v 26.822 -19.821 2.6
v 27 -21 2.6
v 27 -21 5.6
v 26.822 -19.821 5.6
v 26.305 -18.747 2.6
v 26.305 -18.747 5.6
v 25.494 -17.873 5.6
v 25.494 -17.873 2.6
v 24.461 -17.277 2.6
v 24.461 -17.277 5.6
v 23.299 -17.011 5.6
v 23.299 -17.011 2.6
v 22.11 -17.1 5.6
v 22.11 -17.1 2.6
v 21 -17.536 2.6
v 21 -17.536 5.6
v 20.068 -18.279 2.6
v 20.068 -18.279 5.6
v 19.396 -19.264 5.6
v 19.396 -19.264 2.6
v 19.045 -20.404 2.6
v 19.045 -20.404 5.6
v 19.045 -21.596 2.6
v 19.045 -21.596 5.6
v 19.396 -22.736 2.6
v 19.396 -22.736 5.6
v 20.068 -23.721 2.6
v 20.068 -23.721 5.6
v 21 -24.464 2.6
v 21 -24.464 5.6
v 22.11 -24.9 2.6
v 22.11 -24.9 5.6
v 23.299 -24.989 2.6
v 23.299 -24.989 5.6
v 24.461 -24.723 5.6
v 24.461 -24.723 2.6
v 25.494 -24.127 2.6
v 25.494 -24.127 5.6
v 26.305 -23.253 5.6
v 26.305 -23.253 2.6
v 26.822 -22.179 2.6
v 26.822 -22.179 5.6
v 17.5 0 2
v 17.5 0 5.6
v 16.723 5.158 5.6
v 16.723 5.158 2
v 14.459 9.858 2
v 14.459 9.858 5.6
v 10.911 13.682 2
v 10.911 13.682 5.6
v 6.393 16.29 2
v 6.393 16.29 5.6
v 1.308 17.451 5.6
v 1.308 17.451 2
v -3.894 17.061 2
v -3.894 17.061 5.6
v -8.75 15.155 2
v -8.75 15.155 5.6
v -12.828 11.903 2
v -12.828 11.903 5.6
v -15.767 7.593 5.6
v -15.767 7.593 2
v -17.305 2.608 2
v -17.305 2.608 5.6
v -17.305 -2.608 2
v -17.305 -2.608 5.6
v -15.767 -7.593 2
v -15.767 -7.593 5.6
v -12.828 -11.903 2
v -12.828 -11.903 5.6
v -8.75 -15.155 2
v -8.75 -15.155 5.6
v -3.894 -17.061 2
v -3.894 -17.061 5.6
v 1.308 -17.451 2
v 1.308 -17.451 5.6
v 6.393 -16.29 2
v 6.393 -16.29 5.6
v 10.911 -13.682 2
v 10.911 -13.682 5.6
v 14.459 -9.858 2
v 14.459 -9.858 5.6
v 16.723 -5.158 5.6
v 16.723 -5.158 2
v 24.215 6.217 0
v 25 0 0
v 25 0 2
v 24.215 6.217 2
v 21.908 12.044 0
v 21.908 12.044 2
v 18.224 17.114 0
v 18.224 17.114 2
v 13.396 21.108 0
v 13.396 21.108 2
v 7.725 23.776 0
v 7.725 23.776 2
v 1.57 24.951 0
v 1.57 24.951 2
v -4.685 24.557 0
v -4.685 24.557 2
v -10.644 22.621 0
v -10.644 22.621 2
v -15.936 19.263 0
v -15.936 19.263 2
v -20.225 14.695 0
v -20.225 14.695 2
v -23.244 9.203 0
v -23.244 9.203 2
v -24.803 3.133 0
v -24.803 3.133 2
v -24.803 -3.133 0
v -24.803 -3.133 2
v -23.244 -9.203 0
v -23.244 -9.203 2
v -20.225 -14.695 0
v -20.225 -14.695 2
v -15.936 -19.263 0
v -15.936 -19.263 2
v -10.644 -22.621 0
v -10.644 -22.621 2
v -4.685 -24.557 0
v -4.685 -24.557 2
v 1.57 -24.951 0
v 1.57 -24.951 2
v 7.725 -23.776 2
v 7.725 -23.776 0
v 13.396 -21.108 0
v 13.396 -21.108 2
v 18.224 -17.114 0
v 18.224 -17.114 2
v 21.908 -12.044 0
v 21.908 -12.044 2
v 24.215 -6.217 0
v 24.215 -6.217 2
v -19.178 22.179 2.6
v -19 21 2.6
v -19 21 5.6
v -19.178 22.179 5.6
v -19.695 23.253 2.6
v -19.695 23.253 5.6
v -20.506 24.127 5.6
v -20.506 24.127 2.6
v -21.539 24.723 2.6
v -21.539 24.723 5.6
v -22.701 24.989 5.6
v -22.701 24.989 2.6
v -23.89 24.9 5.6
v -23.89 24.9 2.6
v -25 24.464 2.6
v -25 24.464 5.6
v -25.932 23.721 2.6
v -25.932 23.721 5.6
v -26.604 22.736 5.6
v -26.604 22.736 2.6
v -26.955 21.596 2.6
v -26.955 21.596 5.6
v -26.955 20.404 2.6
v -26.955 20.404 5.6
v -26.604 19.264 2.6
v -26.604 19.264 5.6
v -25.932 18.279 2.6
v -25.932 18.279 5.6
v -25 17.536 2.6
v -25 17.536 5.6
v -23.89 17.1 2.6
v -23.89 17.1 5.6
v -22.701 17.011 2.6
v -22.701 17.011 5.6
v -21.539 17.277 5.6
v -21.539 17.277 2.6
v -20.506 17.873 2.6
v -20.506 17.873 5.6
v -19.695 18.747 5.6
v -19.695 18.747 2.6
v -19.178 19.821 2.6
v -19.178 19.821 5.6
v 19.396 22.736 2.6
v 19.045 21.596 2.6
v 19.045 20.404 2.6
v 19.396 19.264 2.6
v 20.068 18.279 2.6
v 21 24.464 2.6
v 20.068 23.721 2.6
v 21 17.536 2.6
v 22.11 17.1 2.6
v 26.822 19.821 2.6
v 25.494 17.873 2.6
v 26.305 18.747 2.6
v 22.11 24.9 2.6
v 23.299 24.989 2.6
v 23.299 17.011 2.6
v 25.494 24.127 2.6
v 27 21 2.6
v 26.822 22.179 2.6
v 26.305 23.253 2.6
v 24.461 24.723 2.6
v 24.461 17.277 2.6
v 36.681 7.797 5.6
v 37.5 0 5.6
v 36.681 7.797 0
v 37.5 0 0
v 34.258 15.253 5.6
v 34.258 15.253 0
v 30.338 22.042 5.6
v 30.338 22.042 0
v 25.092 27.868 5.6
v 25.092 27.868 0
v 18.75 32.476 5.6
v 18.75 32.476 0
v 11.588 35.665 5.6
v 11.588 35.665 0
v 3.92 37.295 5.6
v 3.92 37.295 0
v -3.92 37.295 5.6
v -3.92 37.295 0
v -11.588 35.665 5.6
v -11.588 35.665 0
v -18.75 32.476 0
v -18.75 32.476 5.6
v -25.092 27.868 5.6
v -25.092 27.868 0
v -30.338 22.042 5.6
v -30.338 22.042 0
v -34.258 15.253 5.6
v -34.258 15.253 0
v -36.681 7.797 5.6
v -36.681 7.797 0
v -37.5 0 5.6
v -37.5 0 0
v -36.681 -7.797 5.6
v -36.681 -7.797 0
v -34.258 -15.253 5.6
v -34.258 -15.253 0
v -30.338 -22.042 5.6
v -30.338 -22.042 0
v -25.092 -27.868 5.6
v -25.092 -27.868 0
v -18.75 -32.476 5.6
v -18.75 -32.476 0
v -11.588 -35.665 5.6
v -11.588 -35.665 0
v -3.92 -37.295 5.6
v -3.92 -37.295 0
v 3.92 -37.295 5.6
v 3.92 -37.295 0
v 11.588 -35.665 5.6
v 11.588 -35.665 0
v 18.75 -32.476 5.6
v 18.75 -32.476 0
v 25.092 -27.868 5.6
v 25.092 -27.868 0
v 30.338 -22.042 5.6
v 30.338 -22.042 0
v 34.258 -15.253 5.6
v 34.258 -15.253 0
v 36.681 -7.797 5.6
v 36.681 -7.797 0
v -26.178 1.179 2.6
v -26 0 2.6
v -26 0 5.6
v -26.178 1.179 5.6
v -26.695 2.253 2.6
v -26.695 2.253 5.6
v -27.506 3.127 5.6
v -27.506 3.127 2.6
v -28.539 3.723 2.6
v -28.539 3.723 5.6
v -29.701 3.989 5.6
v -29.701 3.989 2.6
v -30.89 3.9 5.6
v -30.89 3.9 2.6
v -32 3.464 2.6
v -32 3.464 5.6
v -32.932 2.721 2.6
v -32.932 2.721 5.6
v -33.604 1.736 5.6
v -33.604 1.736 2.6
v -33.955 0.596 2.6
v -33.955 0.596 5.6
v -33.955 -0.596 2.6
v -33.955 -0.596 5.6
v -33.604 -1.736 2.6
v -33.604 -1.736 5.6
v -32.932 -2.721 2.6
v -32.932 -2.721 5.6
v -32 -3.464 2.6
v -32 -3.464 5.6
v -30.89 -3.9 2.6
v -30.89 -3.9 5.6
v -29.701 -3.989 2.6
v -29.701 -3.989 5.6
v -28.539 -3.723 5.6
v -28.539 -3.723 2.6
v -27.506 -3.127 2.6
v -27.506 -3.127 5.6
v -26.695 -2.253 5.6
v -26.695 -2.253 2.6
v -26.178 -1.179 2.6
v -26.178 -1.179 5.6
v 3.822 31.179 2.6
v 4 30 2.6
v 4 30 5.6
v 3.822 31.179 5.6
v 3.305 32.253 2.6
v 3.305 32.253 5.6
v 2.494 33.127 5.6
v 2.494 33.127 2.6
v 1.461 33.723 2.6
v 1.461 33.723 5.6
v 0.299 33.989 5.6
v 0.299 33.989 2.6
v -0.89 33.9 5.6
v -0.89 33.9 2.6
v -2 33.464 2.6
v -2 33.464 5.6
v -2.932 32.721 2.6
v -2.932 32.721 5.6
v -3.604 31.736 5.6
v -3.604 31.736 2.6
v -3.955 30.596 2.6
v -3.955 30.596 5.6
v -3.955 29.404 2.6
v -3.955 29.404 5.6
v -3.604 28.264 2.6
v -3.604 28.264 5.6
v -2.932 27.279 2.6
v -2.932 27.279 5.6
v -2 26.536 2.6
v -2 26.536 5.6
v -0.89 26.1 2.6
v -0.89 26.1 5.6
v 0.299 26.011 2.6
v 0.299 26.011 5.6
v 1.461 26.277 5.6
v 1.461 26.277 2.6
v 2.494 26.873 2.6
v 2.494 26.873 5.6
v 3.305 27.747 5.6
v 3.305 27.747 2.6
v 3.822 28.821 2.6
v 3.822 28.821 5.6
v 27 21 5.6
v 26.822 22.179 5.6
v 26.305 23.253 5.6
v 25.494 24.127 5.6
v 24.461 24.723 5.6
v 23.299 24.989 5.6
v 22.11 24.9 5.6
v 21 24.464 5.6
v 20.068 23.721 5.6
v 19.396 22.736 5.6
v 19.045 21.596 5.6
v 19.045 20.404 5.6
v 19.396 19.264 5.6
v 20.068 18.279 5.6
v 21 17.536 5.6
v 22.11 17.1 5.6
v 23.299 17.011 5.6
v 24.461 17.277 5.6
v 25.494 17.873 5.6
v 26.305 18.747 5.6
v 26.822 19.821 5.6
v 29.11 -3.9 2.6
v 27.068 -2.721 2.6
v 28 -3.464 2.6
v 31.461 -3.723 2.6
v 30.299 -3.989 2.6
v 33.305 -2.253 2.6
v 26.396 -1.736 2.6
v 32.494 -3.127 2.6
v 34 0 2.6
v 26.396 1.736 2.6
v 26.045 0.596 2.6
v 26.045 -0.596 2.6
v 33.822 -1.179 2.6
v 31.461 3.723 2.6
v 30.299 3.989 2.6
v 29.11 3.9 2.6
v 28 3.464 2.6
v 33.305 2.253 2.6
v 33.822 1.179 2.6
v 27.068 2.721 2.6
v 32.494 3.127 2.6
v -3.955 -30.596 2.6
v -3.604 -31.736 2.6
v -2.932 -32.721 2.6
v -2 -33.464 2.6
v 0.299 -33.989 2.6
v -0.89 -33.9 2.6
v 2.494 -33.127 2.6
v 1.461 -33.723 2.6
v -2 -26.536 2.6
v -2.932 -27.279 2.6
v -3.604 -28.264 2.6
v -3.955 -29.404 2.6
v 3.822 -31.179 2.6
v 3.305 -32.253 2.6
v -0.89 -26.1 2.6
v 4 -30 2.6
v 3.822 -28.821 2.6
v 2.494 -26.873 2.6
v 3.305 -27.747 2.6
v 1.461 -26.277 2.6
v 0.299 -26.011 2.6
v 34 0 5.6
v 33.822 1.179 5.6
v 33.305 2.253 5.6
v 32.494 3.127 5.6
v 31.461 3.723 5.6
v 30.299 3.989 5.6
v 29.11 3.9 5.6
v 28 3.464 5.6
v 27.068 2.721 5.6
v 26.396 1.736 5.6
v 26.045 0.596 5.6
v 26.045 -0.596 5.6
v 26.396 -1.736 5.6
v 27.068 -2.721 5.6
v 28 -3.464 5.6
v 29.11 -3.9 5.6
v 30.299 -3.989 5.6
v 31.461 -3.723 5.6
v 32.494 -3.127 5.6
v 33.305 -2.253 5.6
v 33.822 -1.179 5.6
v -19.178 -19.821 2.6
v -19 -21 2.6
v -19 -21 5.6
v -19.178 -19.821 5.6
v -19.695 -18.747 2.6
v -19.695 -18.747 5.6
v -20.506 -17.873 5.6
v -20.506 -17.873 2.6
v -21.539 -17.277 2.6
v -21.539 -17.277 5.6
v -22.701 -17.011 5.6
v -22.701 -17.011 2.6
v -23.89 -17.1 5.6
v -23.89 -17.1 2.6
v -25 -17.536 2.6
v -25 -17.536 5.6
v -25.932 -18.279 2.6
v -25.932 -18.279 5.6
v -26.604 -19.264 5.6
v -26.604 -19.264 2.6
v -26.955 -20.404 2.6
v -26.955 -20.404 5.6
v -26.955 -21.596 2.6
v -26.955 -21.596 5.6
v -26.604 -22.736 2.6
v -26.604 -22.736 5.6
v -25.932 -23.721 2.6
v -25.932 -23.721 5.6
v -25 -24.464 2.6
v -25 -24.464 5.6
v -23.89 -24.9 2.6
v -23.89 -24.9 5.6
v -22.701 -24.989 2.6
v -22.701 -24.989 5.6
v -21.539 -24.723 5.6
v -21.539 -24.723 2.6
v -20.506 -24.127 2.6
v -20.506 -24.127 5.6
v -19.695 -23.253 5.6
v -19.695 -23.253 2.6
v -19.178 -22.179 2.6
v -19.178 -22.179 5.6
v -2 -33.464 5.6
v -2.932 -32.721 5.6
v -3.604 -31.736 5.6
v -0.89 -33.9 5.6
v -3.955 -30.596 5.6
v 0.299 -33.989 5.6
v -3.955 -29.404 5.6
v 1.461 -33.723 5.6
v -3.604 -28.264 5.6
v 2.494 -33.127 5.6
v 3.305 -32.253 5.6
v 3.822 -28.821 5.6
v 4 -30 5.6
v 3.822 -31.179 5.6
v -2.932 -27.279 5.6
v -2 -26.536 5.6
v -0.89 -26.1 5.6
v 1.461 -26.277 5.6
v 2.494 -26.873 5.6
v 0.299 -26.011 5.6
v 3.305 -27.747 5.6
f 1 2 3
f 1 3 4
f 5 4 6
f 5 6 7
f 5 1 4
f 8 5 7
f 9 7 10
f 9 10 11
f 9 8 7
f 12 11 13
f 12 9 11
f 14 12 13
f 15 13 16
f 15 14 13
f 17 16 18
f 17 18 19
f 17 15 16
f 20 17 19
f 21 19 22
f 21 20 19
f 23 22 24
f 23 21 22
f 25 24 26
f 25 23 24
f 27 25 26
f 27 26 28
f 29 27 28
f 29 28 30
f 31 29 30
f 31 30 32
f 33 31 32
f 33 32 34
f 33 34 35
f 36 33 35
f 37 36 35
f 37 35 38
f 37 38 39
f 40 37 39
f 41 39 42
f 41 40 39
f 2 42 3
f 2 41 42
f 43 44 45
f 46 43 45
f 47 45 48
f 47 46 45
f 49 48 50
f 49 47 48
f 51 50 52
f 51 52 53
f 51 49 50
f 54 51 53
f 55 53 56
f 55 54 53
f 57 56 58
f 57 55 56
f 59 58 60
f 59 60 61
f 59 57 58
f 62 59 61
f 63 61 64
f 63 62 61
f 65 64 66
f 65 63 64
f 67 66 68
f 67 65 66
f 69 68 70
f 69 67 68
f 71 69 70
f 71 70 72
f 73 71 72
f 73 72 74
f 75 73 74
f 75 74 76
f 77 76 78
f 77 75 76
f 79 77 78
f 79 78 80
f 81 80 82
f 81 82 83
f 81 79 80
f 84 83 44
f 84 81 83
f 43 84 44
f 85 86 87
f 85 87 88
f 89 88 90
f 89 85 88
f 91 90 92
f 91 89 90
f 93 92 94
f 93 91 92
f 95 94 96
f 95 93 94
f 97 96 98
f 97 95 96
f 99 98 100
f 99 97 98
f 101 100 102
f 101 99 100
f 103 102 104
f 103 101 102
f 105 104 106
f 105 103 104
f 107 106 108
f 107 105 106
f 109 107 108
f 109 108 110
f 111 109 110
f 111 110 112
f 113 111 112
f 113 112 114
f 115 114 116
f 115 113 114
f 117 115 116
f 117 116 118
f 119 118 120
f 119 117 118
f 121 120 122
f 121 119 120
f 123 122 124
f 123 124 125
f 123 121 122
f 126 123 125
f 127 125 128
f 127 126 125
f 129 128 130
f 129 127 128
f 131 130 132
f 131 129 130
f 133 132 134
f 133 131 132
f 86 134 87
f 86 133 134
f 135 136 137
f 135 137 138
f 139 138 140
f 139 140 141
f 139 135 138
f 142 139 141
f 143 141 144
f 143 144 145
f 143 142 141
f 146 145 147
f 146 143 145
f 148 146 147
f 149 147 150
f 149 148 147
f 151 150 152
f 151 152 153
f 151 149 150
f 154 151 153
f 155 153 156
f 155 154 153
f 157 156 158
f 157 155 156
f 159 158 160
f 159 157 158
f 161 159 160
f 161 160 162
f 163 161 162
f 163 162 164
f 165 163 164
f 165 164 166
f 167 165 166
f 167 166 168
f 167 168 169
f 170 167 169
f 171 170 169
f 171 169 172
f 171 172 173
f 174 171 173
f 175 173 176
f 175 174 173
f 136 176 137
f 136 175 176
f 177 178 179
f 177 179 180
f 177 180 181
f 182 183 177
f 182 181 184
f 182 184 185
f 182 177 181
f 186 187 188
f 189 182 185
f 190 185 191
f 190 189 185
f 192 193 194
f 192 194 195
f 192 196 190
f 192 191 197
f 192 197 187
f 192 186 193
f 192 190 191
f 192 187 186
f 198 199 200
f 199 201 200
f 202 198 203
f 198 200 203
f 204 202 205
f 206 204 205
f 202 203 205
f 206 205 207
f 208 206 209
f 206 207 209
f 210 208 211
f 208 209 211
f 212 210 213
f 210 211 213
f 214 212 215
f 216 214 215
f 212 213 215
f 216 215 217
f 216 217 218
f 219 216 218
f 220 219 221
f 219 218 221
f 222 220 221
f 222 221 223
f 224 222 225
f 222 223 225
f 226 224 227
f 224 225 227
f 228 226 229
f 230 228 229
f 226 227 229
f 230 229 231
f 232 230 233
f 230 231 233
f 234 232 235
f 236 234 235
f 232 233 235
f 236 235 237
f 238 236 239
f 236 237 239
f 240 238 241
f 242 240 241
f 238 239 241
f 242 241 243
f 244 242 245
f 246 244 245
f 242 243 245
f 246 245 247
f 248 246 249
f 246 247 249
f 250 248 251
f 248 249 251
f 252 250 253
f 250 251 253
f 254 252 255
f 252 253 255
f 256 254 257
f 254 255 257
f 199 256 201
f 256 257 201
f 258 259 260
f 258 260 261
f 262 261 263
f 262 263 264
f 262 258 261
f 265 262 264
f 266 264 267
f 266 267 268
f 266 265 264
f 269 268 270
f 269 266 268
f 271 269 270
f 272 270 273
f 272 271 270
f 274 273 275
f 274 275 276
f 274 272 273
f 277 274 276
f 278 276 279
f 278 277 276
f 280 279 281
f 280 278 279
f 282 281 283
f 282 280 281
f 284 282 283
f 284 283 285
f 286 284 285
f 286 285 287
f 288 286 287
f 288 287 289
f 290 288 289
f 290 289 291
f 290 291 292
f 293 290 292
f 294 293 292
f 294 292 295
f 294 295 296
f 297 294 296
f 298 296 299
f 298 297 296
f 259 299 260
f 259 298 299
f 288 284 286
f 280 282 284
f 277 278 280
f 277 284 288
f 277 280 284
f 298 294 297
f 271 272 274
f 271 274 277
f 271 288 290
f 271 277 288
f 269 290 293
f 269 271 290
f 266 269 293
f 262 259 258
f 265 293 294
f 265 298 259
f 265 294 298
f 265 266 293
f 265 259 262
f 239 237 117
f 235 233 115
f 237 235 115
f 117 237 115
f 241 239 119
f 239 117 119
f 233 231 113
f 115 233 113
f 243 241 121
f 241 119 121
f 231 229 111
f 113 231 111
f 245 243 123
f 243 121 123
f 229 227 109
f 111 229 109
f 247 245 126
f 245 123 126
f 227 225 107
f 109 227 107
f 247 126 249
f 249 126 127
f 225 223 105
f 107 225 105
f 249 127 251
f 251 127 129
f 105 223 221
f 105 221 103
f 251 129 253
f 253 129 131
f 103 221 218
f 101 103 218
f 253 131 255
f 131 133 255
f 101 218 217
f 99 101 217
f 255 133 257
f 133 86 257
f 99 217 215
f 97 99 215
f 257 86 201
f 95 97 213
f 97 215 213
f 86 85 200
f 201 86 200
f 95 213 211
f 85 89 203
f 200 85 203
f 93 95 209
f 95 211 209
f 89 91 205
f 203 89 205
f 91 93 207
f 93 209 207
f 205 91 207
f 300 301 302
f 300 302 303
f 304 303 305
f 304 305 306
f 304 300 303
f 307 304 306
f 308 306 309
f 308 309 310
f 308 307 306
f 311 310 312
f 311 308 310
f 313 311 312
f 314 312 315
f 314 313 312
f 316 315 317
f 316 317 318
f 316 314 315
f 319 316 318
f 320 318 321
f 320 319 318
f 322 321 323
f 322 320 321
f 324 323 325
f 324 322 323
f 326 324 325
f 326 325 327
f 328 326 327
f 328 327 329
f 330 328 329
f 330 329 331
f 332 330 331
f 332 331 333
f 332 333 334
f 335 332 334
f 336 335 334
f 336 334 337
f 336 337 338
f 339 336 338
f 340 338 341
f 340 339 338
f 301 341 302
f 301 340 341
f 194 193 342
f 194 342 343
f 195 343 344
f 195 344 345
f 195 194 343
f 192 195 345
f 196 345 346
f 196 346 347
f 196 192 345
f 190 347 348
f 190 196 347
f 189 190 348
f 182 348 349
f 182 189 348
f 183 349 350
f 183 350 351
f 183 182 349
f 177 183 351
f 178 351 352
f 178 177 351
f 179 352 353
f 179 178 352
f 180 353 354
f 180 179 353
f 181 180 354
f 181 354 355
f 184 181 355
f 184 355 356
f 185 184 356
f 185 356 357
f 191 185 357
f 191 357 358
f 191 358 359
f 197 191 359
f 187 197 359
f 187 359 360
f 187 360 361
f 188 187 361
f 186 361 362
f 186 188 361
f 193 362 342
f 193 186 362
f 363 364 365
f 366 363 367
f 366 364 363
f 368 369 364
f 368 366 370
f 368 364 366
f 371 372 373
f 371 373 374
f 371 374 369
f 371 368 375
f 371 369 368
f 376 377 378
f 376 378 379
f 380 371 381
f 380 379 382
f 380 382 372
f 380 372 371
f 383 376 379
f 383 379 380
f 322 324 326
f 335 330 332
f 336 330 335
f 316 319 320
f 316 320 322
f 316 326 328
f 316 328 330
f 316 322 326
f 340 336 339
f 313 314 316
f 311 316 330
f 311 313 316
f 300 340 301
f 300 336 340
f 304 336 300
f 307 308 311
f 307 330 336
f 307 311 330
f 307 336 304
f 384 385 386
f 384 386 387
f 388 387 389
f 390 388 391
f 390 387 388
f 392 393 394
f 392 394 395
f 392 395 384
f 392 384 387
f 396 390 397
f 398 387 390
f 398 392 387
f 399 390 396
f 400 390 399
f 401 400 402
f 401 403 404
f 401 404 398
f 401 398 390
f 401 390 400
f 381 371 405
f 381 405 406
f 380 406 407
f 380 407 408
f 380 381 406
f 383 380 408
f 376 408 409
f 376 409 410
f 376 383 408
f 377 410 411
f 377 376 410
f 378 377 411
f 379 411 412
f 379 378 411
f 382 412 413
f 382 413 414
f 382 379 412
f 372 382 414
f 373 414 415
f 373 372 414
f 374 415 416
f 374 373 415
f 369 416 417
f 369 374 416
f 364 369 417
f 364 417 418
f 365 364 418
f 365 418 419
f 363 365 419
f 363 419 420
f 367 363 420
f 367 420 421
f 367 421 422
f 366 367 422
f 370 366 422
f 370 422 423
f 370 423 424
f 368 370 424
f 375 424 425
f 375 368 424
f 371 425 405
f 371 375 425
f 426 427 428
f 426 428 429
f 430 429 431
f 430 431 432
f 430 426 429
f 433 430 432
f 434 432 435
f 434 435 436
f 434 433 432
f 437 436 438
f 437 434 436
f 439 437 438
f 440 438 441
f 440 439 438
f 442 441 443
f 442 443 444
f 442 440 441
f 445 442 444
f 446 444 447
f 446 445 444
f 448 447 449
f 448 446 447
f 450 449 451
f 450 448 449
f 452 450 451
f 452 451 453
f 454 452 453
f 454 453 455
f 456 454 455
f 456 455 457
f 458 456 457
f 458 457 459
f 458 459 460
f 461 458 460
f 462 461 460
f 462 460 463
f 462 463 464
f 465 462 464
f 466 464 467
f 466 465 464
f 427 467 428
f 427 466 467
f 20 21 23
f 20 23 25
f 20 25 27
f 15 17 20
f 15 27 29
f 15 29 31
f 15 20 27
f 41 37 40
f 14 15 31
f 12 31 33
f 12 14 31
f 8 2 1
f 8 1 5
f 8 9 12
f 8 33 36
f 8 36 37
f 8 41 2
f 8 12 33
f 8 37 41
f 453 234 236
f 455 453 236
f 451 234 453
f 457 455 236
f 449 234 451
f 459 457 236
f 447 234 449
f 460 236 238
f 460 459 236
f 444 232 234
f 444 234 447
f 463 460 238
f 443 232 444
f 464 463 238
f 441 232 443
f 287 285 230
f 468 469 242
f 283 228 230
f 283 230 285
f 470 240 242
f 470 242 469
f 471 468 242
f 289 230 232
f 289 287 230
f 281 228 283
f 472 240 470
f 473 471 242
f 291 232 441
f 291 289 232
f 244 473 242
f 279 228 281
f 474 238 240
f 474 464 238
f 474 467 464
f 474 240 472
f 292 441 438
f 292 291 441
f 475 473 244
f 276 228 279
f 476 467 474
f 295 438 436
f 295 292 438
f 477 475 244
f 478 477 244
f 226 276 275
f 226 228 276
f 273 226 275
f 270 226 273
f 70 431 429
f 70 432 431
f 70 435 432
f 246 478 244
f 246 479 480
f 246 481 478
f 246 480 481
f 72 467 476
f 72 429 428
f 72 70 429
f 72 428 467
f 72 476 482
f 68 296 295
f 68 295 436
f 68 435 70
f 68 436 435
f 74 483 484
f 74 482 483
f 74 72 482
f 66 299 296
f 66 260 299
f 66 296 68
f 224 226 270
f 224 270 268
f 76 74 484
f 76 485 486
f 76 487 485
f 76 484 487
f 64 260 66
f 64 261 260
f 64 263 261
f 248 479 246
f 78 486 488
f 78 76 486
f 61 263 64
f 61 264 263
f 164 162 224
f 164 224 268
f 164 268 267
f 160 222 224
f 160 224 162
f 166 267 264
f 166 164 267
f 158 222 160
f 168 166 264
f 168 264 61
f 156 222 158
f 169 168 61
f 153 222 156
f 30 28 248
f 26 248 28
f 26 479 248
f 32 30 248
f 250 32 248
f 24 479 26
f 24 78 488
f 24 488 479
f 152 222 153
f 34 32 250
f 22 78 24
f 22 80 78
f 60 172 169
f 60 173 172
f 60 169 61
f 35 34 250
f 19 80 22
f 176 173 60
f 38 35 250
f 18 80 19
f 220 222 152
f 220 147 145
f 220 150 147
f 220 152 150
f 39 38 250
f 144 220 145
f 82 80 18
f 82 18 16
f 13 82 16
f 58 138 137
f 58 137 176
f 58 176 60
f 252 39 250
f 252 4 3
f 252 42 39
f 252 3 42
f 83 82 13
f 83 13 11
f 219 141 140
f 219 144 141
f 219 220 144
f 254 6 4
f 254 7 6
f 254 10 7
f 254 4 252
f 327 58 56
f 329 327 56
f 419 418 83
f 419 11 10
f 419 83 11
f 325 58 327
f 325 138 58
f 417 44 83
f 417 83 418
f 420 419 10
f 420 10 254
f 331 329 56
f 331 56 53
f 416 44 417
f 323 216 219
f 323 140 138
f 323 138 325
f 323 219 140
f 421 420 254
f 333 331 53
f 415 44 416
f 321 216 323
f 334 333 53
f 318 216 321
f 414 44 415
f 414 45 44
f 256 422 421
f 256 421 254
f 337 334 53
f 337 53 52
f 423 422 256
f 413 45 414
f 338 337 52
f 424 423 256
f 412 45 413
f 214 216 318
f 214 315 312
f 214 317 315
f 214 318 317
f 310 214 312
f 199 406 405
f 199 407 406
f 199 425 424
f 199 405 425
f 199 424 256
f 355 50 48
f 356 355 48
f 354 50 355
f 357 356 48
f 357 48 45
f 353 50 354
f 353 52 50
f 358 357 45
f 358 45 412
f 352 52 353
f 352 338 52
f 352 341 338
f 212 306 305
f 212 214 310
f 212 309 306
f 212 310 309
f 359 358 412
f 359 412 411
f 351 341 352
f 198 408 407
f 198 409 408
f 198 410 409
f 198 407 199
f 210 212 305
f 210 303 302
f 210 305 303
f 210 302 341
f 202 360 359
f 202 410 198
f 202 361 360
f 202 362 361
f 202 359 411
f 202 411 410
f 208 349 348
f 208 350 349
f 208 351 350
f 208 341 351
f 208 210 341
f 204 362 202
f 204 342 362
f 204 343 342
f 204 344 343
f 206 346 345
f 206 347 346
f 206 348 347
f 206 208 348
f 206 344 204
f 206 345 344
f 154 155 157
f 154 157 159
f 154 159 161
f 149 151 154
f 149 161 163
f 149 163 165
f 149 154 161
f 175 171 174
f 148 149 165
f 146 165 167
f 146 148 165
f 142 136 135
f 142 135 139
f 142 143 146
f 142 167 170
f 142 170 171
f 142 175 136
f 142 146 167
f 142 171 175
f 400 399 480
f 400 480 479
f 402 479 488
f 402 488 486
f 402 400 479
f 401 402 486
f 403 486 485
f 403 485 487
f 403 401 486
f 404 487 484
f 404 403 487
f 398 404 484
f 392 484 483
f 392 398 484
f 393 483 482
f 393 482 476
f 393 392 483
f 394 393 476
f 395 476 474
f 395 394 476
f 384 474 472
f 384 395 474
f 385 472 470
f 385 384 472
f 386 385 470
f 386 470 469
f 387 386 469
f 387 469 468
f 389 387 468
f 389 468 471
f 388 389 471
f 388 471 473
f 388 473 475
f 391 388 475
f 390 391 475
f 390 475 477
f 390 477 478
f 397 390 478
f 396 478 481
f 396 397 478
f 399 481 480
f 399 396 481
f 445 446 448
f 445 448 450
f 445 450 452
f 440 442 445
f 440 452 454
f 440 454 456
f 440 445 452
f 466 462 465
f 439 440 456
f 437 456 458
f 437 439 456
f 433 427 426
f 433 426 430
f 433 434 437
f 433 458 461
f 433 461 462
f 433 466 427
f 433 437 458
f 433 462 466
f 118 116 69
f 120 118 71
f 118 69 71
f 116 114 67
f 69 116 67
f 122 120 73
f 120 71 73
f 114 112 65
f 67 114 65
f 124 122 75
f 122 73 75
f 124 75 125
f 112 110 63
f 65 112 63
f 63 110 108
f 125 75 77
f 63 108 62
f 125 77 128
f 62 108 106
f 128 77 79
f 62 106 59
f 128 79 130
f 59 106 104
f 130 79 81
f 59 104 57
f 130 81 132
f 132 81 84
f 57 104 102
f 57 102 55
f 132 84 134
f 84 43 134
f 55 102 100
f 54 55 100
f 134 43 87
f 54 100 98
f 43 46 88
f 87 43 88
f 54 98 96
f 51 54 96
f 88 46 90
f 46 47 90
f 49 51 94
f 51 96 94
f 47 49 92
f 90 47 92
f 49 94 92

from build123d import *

# Parameters (mm, degrees)
SKETCH_1_R      = 37.5
SKETCH_1_R_2    = 25
EXTRUDE_1_DEPTH = 2
SKETCH_2_R      = 37.5
SKETCH_2_R_2    = 17.5
EXTRUDE_2_DEPTH = 0.6
SKETCH_3_R      = 37.5
SKETCH_3_R_2    = 17.5
SKETCH_3_R_3    = 4
EXTRUDE_3_DEPTH = 3


with BuildPart() as part:
    # Эскиз1 → Бобышка-Вытянуть1 (new body)
    with BuildSketch(Plane.XY):
        Circle(SKETCH_1_R)
        Circle(SKETCH_1_R_2, mode=Mode.SUBTRACT)
    extrude(amount=EXTRUDE_1_DEPTH)

    # Эскиз2 → Бобышка-Вытянуть2 (add)
    with BuildSketch(Plane.XY.offset(2)):
        Circle(SKETCH_2_R)
        Circle(SKETCH_2_R_2, mode=Mode.SUBTRACT)
    extrude(amount=EXTRUDE_2_DEPTH)

    # Эскиз3 → Бобышка-Вытянуть3 (add)
    with BuildSketch(Plane.XY.offset(2.6)):
        Circle(SKETCH_3_R)
        Circle(SKETCH_3_R_2, mode=Mode.SUBTRACT)
        with Locations((0, 30)):
            Circle(SKETCH_3_R_3, mode=Mode.SUBTRACT)
        with Locations((0, -30)):
            Circle(SKETCH_3_R_3, mode=Mode.SUBTRACT)
        with Locations((30, 0)):
            Circle(SKETCH_3_R_3, mode=Mode.SUBTRACT)
        with Locations((-30, 0)):
            Circle(SKETCH_3_R_3, mode=Mode.SUBTRACT)
        with Locations((23, 21)):
            Circle(SKETCH_3_R_3, mode=Mode.SUBTRACT)
        with Locations((-23, 21)):
            Circle(SKETCH_3_R_3, mode=Mode.SUBTRACT)
        with Locations((-23, -21)):
            Circle(SKETCH_3_R_3, mode=Mode.SUBTRACT)
        with Locations((23, -21)):
            Circle(SKETCH_3_R_3, mode=Mode.SUBTRACT)
    extrude(amount=EXTRUDE_3_DEPTH)


solid = part.part
